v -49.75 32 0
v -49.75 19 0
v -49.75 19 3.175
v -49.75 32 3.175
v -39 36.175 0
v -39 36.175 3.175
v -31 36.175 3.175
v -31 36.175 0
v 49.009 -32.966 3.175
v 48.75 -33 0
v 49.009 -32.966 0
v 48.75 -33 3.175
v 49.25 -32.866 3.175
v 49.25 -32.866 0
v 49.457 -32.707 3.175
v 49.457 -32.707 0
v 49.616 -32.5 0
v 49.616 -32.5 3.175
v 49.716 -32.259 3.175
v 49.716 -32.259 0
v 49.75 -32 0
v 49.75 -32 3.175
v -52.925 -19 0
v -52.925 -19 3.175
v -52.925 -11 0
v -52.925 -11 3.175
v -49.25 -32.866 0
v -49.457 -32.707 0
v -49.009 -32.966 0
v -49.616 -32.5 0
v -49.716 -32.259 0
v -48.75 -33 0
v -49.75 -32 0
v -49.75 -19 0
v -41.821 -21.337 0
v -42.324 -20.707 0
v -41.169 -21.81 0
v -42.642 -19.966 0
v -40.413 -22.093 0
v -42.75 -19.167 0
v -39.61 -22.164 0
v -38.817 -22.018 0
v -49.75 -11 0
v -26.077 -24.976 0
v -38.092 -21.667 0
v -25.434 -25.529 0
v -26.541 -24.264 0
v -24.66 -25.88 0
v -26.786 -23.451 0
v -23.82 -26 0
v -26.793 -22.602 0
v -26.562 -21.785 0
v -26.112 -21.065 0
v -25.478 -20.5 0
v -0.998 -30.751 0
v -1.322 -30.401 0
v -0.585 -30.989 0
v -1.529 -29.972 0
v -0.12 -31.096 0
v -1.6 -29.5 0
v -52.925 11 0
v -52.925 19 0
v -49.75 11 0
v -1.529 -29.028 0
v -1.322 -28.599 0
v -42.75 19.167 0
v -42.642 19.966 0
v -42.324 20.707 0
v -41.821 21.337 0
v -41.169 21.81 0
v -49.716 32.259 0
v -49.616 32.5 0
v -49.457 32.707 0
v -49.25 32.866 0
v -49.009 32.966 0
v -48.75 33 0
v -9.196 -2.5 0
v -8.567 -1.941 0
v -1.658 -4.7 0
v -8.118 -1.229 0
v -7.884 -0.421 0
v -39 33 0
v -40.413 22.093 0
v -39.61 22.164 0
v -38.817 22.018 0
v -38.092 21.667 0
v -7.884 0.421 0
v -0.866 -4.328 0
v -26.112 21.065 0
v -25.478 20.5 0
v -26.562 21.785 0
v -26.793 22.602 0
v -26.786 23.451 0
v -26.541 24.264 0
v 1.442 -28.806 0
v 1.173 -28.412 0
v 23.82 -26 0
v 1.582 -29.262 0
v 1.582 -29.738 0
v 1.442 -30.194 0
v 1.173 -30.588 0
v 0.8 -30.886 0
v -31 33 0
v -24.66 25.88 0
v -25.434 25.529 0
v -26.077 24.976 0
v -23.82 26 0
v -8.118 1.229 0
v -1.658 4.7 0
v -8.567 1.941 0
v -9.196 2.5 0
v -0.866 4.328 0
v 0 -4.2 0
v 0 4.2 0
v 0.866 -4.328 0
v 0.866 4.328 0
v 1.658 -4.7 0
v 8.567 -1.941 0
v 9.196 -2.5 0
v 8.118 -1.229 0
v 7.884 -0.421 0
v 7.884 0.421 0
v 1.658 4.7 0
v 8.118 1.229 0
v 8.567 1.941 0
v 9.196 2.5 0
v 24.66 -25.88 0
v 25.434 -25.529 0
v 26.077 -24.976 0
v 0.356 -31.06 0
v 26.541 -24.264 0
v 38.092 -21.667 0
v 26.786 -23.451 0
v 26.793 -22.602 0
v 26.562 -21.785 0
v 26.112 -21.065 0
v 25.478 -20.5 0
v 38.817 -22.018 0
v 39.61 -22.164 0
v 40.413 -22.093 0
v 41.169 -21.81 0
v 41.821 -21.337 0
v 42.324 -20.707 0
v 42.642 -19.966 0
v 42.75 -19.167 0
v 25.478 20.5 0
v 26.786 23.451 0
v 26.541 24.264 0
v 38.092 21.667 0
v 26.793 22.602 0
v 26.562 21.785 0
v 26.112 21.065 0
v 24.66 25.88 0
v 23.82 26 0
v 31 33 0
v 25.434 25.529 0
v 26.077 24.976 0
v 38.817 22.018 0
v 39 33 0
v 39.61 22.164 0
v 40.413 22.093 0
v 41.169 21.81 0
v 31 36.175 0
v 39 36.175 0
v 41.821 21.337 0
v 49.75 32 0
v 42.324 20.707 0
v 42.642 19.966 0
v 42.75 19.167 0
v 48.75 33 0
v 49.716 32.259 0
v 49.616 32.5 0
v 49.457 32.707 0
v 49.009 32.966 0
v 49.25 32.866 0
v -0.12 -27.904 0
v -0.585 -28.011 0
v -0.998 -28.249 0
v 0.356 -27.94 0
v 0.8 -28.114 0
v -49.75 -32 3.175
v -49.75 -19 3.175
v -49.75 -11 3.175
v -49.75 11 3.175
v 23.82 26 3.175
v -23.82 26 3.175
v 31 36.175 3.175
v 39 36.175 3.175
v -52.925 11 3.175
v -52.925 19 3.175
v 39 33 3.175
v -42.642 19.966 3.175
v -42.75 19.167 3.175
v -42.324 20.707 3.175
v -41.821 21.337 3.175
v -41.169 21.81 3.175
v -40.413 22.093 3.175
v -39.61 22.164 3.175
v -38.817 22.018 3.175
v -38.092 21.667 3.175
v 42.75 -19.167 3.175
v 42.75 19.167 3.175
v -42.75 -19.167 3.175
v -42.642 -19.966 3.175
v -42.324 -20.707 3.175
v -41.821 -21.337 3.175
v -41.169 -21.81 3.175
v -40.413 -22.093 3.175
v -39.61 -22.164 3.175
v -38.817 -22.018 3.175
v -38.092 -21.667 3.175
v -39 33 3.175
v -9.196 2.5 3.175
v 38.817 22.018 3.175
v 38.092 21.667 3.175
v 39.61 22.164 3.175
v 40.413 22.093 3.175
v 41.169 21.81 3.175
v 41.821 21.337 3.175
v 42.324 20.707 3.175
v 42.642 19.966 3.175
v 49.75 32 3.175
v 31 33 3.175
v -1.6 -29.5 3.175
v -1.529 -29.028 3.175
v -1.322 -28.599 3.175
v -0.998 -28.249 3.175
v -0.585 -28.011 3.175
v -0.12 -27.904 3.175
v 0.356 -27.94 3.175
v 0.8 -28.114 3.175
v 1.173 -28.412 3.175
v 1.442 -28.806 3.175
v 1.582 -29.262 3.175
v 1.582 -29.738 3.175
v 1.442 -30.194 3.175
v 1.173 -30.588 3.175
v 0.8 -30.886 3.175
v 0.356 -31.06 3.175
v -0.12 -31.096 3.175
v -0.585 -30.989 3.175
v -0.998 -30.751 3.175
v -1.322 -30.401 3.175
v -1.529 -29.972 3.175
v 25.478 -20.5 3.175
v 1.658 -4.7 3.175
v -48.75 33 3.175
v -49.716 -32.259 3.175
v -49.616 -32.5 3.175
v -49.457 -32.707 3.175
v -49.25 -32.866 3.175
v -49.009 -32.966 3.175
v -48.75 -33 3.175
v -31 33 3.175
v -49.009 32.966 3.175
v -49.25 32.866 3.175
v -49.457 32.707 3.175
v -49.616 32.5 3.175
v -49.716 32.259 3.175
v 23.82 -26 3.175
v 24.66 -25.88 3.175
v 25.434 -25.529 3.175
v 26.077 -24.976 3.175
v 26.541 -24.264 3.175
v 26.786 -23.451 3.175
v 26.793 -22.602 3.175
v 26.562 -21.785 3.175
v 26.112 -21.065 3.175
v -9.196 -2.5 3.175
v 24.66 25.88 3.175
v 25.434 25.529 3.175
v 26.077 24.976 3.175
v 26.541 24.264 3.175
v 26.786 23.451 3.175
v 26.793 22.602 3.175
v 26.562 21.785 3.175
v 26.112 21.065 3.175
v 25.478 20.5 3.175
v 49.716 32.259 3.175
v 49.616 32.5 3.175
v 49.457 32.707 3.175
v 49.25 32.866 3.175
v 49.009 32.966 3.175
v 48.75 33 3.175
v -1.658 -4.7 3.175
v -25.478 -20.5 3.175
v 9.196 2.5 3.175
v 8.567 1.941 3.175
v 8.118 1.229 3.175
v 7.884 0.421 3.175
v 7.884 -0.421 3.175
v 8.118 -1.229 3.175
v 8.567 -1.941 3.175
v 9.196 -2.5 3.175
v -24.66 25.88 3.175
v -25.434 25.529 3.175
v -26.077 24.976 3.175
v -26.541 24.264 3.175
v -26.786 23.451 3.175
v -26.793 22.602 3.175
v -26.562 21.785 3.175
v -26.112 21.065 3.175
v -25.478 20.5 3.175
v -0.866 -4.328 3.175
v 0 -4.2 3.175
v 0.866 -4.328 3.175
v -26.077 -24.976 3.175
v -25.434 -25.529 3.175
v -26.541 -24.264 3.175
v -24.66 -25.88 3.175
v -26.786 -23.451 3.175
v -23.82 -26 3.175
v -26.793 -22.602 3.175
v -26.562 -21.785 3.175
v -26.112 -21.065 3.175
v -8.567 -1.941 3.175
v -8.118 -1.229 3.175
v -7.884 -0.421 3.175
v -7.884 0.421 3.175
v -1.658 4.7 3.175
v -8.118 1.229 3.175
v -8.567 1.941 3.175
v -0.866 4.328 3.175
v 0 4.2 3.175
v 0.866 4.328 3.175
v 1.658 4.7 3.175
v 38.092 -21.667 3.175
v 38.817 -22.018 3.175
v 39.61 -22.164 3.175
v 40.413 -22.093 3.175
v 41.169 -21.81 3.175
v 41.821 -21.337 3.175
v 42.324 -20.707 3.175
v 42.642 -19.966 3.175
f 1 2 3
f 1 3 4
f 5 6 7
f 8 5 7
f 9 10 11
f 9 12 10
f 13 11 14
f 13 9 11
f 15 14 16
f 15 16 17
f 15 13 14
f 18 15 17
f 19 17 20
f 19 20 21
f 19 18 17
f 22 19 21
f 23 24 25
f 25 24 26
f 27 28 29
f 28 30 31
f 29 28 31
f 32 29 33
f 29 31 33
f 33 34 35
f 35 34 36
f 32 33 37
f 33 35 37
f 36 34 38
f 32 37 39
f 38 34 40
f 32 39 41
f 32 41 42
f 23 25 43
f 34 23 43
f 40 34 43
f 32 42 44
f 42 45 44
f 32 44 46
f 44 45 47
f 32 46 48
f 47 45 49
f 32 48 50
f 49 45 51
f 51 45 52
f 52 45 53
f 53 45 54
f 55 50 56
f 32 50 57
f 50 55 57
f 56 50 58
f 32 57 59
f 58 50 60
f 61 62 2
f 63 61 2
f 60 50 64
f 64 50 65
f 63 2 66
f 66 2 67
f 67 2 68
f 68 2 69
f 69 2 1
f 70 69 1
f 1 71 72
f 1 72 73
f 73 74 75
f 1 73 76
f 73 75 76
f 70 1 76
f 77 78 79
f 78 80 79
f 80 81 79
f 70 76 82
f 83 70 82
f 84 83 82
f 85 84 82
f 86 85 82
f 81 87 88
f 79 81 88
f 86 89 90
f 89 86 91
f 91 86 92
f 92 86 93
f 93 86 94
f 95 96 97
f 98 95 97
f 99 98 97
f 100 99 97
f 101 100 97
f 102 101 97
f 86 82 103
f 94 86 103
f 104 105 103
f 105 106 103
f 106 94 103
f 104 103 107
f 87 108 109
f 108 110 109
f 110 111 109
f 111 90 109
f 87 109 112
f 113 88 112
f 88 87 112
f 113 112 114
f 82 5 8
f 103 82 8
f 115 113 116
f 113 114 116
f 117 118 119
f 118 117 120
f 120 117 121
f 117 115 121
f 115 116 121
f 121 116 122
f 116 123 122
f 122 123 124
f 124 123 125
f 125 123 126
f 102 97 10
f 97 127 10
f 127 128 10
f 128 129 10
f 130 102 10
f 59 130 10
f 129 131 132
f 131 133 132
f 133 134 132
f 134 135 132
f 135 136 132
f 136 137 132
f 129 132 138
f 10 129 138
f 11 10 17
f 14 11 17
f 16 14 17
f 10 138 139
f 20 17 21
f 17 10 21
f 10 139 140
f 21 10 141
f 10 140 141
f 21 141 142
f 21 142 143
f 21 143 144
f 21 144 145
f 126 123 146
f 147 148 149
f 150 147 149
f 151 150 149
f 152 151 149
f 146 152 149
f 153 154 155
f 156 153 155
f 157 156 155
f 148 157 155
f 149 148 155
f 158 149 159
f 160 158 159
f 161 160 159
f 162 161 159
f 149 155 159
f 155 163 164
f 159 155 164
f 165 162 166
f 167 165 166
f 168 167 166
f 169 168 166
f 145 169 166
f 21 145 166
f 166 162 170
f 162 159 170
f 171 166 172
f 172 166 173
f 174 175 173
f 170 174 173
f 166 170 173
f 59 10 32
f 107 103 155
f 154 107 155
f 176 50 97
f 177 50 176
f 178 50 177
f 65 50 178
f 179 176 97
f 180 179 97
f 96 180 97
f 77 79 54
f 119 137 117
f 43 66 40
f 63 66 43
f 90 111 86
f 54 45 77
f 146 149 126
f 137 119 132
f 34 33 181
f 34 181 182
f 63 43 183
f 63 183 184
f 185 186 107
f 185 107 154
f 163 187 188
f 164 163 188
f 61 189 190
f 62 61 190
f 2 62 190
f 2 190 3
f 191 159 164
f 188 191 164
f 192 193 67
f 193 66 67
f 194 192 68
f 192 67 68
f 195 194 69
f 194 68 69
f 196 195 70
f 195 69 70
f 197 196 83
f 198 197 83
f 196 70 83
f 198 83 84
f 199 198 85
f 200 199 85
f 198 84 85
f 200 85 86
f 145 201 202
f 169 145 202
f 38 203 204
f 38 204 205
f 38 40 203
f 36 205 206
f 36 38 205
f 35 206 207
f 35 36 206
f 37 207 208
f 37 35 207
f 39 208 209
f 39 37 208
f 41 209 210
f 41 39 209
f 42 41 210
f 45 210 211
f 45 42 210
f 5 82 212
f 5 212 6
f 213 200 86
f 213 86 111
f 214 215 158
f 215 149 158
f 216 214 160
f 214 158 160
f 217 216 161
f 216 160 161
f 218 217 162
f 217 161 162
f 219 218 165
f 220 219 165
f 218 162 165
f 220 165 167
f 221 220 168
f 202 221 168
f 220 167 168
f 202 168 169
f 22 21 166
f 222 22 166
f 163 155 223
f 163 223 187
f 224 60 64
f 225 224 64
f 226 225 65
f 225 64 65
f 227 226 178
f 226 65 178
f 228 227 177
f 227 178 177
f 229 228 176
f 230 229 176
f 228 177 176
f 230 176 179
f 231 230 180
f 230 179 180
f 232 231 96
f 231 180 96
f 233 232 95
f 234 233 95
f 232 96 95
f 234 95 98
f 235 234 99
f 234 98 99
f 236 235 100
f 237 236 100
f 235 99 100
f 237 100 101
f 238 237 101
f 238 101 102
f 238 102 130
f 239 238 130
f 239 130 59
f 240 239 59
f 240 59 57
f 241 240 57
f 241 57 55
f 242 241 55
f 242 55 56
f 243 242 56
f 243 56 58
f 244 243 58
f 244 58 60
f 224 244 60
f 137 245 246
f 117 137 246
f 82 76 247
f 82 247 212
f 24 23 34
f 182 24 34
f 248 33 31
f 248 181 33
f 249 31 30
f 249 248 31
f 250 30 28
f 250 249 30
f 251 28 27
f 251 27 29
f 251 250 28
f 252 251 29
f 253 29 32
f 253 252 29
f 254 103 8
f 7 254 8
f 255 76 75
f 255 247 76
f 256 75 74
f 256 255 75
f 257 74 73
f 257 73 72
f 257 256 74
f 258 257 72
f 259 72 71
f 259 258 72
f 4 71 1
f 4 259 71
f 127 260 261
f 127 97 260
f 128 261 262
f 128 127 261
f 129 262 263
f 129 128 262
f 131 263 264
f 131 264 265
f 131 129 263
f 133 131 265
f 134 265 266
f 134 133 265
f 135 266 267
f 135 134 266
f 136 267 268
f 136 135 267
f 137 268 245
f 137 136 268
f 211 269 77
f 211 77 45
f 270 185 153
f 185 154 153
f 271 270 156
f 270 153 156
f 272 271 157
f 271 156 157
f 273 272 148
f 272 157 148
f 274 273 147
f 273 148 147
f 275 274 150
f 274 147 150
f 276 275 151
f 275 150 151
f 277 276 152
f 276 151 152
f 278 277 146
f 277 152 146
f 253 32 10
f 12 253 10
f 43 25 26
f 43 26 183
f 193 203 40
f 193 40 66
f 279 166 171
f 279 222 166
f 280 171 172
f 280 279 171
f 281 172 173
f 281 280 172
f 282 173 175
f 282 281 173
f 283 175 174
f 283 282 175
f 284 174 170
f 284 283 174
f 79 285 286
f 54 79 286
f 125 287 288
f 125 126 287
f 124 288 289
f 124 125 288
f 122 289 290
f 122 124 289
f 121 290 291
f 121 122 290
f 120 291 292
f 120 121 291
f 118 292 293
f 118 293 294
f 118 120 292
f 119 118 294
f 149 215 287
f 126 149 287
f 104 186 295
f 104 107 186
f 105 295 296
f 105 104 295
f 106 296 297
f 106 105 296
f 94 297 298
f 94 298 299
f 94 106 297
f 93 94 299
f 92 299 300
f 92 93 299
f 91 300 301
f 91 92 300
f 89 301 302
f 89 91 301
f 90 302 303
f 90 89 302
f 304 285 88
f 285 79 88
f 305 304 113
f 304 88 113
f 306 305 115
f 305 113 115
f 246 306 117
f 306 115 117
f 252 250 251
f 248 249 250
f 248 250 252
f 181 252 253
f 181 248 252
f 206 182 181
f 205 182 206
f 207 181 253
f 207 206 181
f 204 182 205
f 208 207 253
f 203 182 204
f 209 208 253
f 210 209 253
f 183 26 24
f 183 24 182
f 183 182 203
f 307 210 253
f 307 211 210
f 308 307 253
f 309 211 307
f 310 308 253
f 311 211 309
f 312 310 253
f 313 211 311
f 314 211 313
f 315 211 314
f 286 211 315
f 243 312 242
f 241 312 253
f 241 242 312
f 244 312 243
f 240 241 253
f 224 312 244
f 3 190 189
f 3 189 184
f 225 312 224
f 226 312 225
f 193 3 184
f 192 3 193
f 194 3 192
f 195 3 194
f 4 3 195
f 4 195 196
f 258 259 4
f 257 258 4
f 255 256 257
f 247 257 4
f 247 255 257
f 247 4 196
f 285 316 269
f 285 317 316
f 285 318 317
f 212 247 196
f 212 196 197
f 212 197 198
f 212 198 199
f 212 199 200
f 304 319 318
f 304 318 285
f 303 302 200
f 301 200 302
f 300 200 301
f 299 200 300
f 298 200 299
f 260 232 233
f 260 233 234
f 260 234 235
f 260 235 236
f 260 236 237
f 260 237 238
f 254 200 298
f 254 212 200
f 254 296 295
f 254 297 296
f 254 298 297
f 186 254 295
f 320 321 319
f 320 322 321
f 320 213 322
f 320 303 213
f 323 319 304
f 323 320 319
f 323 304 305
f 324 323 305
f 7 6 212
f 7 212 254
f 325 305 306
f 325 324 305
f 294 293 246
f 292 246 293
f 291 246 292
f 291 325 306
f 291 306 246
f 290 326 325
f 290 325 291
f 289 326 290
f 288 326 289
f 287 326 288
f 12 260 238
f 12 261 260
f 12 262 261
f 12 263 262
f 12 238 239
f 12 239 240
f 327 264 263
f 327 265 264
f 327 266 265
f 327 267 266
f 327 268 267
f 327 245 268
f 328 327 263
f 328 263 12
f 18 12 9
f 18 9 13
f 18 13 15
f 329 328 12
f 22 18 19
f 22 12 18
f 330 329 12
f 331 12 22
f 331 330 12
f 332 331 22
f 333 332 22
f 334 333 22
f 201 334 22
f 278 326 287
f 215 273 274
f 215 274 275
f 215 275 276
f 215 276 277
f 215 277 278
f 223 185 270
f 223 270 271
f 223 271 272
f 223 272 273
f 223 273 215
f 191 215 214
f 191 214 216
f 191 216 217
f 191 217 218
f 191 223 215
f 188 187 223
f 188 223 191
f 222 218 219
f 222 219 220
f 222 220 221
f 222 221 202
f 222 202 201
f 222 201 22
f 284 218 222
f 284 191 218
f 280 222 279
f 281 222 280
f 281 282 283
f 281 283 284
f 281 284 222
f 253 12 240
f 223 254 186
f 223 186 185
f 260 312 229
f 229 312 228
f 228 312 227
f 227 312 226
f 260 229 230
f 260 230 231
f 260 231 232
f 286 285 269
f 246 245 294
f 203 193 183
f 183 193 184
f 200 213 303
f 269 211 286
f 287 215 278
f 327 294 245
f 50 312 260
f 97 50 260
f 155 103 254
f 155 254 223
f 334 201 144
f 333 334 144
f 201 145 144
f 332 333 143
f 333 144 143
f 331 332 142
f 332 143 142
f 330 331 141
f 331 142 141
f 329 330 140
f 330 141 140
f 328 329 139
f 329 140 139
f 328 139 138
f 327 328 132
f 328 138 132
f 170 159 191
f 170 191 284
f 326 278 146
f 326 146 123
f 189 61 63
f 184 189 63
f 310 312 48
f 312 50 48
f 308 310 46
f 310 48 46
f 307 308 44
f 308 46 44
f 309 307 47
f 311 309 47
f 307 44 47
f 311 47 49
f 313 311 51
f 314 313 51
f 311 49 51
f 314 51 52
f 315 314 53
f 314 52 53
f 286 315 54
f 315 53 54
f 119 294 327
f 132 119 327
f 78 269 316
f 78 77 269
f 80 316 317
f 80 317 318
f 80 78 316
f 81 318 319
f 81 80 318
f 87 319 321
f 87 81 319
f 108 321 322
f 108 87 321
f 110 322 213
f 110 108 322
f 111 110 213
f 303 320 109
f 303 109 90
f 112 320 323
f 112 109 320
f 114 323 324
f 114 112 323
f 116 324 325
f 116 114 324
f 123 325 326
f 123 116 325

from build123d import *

# Parameters (mm, degrees)
SKETCH1_W                = 99.5
SKETCH1_H                = 66
BOSS_EXTRUDE1_DEPTH      = 3.175
CUT_EXTRUDE1_DEPTH       = 60.784137737
M3_CLEARANCE_HOLE1_D     = 3.2
M3_CLEARANCE_HOLE1_DEPTH = 12
M3_CLEARANCE_HOLE1_TIP   = 0.96137699
SKETCH6_W                = 3.175
SKETCH6_H                = 8
SKETCH6_W_2              = 8
SKETCH6_H_2              = 3.175
BOSS_EXTRUDE2_DEPTH      = 3.175
FILLET1_R                = 3
FILLET2_R                = 1


with BuildPart() as part:
    # Sketch1 → Boss-Extrude1 (new body)
    with BuildSketch(Plane.XY):
        Rectangle(SKETCH1_W, SKETCH1_H)
    extrude(amount=BOSS_EXTRUDE1_DEPTH)

    # Sketch2 → Cut-Extrude1 (cut, through all)
    with BuildSketch(Plane.XY.offset(3.175)):
        Polygon((-42.75, 24.756797808), (-5.427251789, 0), (-42.75, -24.756797808), align=None)
        Polygon((33.769717908, 26), (0, 3.599986111), (-33.769717908, 26), align=None)
        Polygon((42.75, 24.756797808), (5.427251789, 0), (42.75, -24.756797808), align=None)
        Polygon((-33.769717908, -26), (33.769717908, -26), (0, -3.599986111), align=None)
    extrude(amount=-CUT_EXTRUDE1_DEPTH, mode=Mode.SUBTRACT)

    # M3 Clearance Hole1
    with Locations(Plane.XY.offset(3.175)):
        with Locations((0, -29.5)):
            Hole(M3_CLEARANCE_HOLE1_D / 2, depth=M3_CLEARANCE_HOLE1_DEPTH)
            with Locations((0, 0, -(M3_CLEARANCE_HOLE1_DEPTH + M3_CLEARANCE_HOLE1_TIP / 2))):  # 118° drill point
                Cone(0, M3_CLEARANCE_HOLE1_D / 2, M3_CLEARANCE_HOLE1_TIP, mode=Mode.SUBTRACT)

    # Sketch6 → Boss-Extrude2 (add)
    with BuildSketch(Plane.XY.offset(3.175)):
        with Locations((-51.3375, 15)):
            Rectangle(SKETCH6_W, SKETCH6_H)
        with Locations((-51.3375, -15)):
            Rectangle(SKETCH6_W, SKETCH6_H)
        with Locations((-35, 34.5875)):
            Rectangle(SKETCH6_W_2, SKETCH6_H_2)
        with Locations((35, 34.5875)):
            Rectangle(SKETCH6_W_2, SKETCH6_H_2)
    extrude(amount=-BOSS_EXTRUDE2_DEPTH)

    # Fillet1
    fillet1_edges = [part.edges().sort_by_distance(p)[0] for p in [
        (42.75, 24.756797808, 1.5875),
        (42.75, -24.756797808, 1.5875),
        (5.427251789, 0, 1.5875),
        (-33.769717908, 26, 1.5875),
        (33.769717908, 26, 1.5875),
        (0, 3.599986111, 1.5875),
        (0, -3.599986111, 1.5875),
        (33.769717908, -26, 1.5875),
        (-33.769717908, -26, 1.5875),
        (-42.75, -24.756797808, 1.5875),
        (-42.75, 24.756797808, 1.5875),
        (-5.427251789, 0, 1.5875),
    ]]
    fillet(fillet1_edges, radius=FILLET1_R)

    # Fillet2
    fillet2_edges = [part.edges().sort_by_distance(p)[0] for p in [
        (49.75, -33, 1.5875),
        (-49.75, -33, 1.5875),
        (-49.75, 33, 1.5875),
        (49.75, 33, 1.5875),
    ]]
    fillet(fillet2_edges, radius=FILLET2_R)


solid = part.part
